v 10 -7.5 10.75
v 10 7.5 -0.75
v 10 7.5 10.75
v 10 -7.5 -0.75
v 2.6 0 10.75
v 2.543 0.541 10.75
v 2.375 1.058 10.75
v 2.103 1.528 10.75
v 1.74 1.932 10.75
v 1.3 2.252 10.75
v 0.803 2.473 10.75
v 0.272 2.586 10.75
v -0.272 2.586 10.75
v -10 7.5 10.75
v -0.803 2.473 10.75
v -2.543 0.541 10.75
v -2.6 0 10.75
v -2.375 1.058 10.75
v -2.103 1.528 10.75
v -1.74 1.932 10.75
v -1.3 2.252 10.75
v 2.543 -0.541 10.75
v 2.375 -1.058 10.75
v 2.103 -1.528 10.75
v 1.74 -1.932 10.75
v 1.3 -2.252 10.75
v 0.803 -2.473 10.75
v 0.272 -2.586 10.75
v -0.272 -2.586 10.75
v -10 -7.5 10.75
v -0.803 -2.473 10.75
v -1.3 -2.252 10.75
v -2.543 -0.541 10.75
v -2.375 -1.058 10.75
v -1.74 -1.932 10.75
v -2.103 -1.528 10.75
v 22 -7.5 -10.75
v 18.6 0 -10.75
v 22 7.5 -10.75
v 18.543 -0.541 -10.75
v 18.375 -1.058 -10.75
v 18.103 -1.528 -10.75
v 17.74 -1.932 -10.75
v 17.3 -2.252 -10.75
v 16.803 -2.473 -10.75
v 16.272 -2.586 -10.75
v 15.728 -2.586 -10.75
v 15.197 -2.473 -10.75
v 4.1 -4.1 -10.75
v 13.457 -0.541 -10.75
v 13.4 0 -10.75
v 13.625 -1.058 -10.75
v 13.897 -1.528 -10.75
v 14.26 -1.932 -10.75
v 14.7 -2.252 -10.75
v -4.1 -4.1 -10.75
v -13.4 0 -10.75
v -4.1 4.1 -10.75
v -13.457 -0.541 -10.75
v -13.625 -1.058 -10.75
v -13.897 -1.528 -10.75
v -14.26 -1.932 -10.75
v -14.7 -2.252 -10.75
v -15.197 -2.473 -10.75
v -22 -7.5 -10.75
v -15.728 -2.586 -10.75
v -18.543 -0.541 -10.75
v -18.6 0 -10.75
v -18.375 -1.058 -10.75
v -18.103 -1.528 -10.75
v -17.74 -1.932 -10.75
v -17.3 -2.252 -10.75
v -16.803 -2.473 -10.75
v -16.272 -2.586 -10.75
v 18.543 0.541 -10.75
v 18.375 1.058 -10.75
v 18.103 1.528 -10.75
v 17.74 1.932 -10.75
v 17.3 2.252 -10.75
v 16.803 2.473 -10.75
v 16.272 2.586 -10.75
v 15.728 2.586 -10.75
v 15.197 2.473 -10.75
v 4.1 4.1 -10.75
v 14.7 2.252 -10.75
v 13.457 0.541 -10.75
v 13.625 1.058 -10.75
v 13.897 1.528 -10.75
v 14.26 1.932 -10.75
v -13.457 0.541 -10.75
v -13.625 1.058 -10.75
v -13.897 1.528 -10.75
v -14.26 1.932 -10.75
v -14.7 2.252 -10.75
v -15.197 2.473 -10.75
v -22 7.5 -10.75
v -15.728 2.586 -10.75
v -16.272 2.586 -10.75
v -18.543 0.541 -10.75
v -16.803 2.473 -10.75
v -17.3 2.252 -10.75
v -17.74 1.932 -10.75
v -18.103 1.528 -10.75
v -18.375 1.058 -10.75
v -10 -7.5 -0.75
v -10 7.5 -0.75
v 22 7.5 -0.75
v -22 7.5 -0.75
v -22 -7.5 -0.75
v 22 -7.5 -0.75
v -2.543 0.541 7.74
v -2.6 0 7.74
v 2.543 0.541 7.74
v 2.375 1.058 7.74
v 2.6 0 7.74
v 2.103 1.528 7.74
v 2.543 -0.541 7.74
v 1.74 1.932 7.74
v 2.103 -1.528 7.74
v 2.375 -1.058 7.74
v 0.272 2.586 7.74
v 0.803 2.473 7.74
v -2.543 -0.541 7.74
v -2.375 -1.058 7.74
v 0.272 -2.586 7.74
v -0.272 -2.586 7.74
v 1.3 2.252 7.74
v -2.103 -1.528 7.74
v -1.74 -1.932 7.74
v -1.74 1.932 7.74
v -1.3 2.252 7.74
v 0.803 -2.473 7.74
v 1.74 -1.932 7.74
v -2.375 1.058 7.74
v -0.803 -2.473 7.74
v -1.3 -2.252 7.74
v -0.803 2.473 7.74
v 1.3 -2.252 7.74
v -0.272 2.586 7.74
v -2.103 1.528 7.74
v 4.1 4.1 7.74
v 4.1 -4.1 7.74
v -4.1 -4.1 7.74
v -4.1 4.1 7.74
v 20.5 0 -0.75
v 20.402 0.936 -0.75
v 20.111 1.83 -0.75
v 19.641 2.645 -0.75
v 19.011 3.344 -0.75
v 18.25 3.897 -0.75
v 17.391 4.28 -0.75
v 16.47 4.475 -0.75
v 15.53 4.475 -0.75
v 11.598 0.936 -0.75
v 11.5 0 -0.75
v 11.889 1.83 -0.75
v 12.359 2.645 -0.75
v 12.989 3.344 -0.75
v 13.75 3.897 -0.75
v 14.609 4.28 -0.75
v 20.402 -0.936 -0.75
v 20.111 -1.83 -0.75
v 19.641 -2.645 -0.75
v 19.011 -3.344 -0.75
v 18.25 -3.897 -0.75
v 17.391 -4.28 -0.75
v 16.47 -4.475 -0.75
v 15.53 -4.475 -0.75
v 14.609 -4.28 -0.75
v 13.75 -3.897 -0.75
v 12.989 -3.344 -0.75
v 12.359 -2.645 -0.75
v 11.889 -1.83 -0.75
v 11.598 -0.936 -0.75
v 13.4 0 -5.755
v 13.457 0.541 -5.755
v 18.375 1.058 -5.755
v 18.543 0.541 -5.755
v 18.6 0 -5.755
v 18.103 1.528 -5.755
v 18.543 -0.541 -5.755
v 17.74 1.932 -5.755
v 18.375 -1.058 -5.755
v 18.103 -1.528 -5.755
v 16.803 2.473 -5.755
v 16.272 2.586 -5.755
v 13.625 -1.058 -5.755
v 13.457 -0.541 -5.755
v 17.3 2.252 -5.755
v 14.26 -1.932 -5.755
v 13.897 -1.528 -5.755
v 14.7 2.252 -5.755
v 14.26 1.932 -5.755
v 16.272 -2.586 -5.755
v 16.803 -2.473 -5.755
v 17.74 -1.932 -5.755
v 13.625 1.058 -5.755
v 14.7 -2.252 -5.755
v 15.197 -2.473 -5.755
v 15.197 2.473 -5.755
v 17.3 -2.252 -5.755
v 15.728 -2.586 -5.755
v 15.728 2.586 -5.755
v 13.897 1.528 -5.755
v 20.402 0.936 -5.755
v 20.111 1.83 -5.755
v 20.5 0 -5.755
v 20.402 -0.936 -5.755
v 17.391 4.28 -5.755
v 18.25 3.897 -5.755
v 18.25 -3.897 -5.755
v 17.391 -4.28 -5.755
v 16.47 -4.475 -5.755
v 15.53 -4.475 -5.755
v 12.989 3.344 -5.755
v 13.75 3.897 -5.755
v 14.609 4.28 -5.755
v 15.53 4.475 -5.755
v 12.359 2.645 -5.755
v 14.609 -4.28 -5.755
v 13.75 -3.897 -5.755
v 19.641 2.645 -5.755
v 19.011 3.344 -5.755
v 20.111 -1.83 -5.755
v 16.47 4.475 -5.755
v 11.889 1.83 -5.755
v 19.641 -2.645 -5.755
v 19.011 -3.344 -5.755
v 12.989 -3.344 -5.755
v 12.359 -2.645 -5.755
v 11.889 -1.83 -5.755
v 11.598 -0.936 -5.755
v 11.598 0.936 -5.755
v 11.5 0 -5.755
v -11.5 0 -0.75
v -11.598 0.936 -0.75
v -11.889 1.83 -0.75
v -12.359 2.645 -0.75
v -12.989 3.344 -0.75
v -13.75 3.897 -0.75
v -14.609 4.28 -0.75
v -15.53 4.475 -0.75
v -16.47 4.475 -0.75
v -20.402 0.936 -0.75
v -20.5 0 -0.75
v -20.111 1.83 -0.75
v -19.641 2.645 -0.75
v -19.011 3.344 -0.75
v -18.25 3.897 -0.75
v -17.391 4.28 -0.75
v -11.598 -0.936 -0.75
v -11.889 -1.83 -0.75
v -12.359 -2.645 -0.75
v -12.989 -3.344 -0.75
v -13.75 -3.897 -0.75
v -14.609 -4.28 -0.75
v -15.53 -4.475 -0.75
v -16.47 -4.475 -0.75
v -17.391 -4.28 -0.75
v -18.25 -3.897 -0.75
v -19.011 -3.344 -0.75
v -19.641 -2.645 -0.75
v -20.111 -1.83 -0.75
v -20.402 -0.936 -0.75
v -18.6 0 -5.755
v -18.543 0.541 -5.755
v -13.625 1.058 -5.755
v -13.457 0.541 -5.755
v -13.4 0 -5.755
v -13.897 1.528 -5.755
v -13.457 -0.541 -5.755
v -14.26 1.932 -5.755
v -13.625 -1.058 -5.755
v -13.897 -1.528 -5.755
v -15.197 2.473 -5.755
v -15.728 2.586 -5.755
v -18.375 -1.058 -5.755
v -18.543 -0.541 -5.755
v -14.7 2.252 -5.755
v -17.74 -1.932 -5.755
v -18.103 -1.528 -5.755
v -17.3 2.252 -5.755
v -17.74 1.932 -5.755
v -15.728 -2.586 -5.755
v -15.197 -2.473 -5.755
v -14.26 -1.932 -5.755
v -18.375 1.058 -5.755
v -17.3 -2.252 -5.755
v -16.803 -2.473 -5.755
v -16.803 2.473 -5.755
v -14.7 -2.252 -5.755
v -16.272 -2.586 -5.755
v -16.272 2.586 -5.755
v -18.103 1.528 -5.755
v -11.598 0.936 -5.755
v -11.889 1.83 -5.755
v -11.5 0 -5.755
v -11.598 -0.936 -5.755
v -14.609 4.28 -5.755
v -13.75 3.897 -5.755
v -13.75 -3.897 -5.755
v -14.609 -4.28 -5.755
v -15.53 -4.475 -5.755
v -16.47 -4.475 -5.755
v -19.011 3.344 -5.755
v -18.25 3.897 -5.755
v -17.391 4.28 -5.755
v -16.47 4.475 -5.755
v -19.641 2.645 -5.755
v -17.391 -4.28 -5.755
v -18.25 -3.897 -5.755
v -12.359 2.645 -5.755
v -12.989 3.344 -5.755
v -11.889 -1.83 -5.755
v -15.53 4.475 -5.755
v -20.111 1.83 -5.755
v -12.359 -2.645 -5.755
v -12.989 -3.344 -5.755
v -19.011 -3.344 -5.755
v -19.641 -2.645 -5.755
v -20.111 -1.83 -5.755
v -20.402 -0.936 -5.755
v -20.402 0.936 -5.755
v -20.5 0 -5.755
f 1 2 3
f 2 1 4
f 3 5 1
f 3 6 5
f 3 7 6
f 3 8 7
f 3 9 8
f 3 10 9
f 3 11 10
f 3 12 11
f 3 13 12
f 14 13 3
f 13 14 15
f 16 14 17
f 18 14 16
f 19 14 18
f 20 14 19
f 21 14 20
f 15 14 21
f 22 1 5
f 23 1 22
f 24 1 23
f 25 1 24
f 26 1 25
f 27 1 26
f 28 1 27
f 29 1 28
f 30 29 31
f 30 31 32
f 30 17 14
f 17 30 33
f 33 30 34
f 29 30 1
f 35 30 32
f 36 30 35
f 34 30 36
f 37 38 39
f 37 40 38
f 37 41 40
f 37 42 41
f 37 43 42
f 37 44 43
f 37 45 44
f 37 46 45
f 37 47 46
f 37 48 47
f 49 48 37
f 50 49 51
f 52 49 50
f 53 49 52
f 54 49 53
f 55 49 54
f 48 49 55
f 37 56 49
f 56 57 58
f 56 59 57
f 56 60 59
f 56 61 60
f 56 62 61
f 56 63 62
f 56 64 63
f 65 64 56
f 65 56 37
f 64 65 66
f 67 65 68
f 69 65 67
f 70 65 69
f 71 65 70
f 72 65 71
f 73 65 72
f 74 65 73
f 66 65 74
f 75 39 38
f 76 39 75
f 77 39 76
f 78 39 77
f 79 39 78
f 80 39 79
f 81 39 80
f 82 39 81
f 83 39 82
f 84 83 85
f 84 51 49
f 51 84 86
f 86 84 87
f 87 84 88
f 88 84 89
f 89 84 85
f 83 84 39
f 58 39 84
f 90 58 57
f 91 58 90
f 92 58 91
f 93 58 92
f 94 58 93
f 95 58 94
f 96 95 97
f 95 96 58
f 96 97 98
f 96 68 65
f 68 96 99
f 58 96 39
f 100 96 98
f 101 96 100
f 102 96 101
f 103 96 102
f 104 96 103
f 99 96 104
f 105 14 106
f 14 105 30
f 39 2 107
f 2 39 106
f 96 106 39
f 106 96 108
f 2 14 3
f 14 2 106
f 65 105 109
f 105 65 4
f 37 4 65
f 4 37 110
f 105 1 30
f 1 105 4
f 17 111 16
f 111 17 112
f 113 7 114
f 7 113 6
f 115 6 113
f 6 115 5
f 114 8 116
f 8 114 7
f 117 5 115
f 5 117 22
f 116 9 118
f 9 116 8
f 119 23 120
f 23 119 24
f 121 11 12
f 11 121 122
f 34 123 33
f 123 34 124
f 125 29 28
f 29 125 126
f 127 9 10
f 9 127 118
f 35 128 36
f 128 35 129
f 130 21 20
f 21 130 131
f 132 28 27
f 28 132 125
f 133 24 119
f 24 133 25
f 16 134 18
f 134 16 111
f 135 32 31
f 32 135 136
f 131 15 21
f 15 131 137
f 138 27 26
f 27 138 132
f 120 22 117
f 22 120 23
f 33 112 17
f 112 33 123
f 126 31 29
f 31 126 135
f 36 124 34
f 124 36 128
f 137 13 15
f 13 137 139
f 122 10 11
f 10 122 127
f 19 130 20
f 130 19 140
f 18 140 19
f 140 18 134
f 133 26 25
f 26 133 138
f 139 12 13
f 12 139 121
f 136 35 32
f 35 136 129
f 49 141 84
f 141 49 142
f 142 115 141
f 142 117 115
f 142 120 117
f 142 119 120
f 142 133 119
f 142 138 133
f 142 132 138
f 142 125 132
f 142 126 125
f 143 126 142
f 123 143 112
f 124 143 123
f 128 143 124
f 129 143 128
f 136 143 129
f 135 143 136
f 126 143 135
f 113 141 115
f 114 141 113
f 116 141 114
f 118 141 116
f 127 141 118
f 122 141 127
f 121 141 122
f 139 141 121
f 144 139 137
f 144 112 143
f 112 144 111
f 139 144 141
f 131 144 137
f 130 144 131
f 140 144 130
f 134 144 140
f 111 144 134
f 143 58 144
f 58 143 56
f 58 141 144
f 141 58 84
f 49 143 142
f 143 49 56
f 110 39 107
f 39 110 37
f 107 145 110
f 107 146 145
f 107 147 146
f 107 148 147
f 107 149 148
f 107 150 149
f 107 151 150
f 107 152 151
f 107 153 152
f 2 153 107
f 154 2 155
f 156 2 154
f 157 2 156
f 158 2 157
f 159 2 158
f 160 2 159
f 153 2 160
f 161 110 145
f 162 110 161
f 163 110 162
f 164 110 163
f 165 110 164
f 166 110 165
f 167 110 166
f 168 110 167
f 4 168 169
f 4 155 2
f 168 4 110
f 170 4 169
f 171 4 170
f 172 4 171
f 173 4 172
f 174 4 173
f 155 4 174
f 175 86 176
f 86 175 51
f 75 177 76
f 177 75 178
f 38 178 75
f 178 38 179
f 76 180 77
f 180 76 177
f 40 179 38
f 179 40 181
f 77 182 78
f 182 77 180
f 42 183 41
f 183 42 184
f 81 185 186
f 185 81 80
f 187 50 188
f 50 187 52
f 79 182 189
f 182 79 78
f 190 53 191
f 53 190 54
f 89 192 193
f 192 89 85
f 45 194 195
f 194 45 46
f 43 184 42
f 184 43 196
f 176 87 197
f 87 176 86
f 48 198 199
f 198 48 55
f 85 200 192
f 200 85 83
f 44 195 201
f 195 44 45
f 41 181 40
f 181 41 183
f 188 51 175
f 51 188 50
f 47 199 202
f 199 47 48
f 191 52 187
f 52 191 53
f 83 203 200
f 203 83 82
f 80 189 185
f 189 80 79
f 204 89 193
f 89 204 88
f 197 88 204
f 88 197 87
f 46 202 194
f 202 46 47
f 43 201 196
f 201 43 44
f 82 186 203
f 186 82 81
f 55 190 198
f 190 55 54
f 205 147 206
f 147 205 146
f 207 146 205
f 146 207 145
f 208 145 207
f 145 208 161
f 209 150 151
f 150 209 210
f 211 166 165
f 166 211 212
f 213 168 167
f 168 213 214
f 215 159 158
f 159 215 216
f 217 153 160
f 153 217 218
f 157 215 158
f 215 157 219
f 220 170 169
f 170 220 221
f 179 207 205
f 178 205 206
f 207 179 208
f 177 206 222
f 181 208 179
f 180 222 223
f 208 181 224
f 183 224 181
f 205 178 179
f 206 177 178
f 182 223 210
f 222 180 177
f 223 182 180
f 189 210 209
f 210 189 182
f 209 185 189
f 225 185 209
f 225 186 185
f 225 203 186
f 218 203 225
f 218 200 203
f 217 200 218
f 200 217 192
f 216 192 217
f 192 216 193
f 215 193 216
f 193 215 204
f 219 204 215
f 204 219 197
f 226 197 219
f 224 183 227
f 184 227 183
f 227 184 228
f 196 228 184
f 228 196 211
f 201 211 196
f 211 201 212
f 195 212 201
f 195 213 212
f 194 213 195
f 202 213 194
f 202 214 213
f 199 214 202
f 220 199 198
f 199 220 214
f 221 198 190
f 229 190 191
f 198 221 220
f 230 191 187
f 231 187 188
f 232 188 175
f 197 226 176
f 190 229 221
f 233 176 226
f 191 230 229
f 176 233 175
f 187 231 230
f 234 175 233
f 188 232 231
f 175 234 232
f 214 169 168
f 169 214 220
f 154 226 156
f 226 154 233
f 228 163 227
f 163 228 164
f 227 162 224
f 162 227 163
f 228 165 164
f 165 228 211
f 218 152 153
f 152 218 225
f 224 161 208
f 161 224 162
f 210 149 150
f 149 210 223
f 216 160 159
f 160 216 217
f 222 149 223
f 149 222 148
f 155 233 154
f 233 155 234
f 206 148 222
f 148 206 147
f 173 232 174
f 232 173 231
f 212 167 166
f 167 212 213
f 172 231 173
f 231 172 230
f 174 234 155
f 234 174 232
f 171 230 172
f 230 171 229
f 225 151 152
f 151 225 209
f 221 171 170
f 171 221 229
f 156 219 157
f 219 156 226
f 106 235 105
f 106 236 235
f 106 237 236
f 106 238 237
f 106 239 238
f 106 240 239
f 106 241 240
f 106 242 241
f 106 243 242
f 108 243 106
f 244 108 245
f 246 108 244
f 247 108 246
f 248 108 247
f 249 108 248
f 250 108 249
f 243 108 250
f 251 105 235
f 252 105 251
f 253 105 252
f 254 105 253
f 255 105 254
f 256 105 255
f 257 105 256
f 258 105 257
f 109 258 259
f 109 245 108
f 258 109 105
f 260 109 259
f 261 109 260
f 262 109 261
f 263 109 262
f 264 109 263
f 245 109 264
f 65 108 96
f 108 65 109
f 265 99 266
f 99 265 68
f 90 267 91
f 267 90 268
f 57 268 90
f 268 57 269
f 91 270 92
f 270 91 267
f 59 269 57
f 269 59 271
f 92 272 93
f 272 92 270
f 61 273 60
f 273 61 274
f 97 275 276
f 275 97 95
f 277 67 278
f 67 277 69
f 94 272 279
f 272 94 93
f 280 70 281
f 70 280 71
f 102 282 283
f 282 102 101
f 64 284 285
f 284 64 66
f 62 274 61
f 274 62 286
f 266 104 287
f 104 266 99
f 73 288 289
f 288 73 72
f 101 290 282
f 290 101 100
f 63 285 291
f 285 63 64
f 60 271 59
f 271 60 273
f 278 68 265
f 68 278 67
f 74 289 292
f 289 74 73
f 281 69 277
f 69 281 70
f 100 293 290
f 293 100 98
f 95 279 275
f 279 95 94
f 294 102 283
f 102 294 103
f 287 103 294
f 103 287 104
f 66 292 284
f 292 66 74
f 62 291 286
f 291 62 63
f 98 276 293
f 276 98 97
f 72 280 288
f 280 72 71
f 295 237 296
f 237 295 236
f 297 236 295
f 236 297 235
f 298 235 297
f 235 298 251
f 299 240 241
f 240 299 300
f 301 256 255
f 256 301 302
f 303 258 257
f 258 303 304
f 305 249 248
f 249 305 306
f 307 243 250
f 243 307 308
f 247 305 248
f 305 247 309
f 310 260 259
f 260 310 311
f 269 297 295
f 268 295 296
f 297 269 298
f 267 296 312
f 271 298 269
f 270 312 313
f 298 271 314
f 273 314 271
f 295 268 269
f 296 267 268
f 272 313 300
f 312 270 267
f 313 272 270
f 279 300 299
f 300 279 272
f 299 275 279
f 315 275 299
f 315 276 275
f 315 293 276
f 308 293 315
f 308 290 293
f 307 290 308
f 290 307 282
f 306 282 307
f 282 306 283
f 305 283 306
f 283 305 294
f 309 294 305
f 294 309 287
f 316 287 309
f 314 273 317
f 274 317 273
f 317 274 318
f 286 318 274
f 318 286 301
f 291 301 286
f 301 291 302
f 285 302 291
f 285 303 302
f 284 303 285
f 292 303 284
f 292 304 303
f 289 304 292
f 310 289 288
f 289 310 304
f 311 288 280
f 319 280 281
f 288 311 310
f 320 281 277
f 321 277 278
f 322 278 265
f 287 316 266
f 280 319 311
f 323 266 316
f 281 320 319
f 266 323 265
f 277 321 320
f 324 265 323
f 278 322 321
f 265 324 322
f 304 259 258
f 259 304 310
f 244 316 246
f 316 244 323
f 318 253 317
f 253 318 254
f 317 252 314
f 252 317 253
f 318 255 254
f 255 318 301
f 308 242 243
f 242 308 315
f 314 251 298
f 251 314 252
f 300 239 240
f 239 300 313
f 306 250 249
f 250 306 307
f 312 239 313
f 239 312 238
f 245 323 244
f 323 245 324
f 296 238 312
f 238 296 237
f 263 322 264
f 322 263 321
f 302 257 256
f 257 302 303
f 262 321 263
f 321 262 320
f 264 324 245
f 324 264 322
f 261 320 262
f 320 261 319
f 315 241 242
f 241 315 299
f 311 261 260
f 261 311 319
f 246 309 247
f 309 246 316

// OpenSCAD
$fn=30;

hookBlock(21.5);

module hookBlock (hookBlockHeight) {



    difference() {
        cube([20, 15, hookBlockHeight], center = true);
        cylinder(d = 5.2, h = hookBlockHeight + 0.1, center = true);
        translate([0, 0, - 1.51]) {
            cube([8.2, 8.2, hookBlockHeight - 3], center = true);
        }
    }

    translate([16, 0, - hookBlockHeight / 2 + 5]) {
        difference() {
            cube([12, 15, 10], center = true);
            cylinder(d = 5.2, h = 10.01, center = true);
            translate([0, 0, 2.5]) {
                cylinder(d = 9, h = 5.01, center = true);
            }
        }
    }

    translate([- 16, 0, - hookBlockHeight / 2 + 5]) {
        difference() {
            cube([12, 15, 10], center = true);
            cylinder(d = 5.2, h = 10.01, center = true);
            translate([0, 0, 2.5]) {
                cylinder(d = 9, h = 5.01, center = true);
            }
        }
    }
}
